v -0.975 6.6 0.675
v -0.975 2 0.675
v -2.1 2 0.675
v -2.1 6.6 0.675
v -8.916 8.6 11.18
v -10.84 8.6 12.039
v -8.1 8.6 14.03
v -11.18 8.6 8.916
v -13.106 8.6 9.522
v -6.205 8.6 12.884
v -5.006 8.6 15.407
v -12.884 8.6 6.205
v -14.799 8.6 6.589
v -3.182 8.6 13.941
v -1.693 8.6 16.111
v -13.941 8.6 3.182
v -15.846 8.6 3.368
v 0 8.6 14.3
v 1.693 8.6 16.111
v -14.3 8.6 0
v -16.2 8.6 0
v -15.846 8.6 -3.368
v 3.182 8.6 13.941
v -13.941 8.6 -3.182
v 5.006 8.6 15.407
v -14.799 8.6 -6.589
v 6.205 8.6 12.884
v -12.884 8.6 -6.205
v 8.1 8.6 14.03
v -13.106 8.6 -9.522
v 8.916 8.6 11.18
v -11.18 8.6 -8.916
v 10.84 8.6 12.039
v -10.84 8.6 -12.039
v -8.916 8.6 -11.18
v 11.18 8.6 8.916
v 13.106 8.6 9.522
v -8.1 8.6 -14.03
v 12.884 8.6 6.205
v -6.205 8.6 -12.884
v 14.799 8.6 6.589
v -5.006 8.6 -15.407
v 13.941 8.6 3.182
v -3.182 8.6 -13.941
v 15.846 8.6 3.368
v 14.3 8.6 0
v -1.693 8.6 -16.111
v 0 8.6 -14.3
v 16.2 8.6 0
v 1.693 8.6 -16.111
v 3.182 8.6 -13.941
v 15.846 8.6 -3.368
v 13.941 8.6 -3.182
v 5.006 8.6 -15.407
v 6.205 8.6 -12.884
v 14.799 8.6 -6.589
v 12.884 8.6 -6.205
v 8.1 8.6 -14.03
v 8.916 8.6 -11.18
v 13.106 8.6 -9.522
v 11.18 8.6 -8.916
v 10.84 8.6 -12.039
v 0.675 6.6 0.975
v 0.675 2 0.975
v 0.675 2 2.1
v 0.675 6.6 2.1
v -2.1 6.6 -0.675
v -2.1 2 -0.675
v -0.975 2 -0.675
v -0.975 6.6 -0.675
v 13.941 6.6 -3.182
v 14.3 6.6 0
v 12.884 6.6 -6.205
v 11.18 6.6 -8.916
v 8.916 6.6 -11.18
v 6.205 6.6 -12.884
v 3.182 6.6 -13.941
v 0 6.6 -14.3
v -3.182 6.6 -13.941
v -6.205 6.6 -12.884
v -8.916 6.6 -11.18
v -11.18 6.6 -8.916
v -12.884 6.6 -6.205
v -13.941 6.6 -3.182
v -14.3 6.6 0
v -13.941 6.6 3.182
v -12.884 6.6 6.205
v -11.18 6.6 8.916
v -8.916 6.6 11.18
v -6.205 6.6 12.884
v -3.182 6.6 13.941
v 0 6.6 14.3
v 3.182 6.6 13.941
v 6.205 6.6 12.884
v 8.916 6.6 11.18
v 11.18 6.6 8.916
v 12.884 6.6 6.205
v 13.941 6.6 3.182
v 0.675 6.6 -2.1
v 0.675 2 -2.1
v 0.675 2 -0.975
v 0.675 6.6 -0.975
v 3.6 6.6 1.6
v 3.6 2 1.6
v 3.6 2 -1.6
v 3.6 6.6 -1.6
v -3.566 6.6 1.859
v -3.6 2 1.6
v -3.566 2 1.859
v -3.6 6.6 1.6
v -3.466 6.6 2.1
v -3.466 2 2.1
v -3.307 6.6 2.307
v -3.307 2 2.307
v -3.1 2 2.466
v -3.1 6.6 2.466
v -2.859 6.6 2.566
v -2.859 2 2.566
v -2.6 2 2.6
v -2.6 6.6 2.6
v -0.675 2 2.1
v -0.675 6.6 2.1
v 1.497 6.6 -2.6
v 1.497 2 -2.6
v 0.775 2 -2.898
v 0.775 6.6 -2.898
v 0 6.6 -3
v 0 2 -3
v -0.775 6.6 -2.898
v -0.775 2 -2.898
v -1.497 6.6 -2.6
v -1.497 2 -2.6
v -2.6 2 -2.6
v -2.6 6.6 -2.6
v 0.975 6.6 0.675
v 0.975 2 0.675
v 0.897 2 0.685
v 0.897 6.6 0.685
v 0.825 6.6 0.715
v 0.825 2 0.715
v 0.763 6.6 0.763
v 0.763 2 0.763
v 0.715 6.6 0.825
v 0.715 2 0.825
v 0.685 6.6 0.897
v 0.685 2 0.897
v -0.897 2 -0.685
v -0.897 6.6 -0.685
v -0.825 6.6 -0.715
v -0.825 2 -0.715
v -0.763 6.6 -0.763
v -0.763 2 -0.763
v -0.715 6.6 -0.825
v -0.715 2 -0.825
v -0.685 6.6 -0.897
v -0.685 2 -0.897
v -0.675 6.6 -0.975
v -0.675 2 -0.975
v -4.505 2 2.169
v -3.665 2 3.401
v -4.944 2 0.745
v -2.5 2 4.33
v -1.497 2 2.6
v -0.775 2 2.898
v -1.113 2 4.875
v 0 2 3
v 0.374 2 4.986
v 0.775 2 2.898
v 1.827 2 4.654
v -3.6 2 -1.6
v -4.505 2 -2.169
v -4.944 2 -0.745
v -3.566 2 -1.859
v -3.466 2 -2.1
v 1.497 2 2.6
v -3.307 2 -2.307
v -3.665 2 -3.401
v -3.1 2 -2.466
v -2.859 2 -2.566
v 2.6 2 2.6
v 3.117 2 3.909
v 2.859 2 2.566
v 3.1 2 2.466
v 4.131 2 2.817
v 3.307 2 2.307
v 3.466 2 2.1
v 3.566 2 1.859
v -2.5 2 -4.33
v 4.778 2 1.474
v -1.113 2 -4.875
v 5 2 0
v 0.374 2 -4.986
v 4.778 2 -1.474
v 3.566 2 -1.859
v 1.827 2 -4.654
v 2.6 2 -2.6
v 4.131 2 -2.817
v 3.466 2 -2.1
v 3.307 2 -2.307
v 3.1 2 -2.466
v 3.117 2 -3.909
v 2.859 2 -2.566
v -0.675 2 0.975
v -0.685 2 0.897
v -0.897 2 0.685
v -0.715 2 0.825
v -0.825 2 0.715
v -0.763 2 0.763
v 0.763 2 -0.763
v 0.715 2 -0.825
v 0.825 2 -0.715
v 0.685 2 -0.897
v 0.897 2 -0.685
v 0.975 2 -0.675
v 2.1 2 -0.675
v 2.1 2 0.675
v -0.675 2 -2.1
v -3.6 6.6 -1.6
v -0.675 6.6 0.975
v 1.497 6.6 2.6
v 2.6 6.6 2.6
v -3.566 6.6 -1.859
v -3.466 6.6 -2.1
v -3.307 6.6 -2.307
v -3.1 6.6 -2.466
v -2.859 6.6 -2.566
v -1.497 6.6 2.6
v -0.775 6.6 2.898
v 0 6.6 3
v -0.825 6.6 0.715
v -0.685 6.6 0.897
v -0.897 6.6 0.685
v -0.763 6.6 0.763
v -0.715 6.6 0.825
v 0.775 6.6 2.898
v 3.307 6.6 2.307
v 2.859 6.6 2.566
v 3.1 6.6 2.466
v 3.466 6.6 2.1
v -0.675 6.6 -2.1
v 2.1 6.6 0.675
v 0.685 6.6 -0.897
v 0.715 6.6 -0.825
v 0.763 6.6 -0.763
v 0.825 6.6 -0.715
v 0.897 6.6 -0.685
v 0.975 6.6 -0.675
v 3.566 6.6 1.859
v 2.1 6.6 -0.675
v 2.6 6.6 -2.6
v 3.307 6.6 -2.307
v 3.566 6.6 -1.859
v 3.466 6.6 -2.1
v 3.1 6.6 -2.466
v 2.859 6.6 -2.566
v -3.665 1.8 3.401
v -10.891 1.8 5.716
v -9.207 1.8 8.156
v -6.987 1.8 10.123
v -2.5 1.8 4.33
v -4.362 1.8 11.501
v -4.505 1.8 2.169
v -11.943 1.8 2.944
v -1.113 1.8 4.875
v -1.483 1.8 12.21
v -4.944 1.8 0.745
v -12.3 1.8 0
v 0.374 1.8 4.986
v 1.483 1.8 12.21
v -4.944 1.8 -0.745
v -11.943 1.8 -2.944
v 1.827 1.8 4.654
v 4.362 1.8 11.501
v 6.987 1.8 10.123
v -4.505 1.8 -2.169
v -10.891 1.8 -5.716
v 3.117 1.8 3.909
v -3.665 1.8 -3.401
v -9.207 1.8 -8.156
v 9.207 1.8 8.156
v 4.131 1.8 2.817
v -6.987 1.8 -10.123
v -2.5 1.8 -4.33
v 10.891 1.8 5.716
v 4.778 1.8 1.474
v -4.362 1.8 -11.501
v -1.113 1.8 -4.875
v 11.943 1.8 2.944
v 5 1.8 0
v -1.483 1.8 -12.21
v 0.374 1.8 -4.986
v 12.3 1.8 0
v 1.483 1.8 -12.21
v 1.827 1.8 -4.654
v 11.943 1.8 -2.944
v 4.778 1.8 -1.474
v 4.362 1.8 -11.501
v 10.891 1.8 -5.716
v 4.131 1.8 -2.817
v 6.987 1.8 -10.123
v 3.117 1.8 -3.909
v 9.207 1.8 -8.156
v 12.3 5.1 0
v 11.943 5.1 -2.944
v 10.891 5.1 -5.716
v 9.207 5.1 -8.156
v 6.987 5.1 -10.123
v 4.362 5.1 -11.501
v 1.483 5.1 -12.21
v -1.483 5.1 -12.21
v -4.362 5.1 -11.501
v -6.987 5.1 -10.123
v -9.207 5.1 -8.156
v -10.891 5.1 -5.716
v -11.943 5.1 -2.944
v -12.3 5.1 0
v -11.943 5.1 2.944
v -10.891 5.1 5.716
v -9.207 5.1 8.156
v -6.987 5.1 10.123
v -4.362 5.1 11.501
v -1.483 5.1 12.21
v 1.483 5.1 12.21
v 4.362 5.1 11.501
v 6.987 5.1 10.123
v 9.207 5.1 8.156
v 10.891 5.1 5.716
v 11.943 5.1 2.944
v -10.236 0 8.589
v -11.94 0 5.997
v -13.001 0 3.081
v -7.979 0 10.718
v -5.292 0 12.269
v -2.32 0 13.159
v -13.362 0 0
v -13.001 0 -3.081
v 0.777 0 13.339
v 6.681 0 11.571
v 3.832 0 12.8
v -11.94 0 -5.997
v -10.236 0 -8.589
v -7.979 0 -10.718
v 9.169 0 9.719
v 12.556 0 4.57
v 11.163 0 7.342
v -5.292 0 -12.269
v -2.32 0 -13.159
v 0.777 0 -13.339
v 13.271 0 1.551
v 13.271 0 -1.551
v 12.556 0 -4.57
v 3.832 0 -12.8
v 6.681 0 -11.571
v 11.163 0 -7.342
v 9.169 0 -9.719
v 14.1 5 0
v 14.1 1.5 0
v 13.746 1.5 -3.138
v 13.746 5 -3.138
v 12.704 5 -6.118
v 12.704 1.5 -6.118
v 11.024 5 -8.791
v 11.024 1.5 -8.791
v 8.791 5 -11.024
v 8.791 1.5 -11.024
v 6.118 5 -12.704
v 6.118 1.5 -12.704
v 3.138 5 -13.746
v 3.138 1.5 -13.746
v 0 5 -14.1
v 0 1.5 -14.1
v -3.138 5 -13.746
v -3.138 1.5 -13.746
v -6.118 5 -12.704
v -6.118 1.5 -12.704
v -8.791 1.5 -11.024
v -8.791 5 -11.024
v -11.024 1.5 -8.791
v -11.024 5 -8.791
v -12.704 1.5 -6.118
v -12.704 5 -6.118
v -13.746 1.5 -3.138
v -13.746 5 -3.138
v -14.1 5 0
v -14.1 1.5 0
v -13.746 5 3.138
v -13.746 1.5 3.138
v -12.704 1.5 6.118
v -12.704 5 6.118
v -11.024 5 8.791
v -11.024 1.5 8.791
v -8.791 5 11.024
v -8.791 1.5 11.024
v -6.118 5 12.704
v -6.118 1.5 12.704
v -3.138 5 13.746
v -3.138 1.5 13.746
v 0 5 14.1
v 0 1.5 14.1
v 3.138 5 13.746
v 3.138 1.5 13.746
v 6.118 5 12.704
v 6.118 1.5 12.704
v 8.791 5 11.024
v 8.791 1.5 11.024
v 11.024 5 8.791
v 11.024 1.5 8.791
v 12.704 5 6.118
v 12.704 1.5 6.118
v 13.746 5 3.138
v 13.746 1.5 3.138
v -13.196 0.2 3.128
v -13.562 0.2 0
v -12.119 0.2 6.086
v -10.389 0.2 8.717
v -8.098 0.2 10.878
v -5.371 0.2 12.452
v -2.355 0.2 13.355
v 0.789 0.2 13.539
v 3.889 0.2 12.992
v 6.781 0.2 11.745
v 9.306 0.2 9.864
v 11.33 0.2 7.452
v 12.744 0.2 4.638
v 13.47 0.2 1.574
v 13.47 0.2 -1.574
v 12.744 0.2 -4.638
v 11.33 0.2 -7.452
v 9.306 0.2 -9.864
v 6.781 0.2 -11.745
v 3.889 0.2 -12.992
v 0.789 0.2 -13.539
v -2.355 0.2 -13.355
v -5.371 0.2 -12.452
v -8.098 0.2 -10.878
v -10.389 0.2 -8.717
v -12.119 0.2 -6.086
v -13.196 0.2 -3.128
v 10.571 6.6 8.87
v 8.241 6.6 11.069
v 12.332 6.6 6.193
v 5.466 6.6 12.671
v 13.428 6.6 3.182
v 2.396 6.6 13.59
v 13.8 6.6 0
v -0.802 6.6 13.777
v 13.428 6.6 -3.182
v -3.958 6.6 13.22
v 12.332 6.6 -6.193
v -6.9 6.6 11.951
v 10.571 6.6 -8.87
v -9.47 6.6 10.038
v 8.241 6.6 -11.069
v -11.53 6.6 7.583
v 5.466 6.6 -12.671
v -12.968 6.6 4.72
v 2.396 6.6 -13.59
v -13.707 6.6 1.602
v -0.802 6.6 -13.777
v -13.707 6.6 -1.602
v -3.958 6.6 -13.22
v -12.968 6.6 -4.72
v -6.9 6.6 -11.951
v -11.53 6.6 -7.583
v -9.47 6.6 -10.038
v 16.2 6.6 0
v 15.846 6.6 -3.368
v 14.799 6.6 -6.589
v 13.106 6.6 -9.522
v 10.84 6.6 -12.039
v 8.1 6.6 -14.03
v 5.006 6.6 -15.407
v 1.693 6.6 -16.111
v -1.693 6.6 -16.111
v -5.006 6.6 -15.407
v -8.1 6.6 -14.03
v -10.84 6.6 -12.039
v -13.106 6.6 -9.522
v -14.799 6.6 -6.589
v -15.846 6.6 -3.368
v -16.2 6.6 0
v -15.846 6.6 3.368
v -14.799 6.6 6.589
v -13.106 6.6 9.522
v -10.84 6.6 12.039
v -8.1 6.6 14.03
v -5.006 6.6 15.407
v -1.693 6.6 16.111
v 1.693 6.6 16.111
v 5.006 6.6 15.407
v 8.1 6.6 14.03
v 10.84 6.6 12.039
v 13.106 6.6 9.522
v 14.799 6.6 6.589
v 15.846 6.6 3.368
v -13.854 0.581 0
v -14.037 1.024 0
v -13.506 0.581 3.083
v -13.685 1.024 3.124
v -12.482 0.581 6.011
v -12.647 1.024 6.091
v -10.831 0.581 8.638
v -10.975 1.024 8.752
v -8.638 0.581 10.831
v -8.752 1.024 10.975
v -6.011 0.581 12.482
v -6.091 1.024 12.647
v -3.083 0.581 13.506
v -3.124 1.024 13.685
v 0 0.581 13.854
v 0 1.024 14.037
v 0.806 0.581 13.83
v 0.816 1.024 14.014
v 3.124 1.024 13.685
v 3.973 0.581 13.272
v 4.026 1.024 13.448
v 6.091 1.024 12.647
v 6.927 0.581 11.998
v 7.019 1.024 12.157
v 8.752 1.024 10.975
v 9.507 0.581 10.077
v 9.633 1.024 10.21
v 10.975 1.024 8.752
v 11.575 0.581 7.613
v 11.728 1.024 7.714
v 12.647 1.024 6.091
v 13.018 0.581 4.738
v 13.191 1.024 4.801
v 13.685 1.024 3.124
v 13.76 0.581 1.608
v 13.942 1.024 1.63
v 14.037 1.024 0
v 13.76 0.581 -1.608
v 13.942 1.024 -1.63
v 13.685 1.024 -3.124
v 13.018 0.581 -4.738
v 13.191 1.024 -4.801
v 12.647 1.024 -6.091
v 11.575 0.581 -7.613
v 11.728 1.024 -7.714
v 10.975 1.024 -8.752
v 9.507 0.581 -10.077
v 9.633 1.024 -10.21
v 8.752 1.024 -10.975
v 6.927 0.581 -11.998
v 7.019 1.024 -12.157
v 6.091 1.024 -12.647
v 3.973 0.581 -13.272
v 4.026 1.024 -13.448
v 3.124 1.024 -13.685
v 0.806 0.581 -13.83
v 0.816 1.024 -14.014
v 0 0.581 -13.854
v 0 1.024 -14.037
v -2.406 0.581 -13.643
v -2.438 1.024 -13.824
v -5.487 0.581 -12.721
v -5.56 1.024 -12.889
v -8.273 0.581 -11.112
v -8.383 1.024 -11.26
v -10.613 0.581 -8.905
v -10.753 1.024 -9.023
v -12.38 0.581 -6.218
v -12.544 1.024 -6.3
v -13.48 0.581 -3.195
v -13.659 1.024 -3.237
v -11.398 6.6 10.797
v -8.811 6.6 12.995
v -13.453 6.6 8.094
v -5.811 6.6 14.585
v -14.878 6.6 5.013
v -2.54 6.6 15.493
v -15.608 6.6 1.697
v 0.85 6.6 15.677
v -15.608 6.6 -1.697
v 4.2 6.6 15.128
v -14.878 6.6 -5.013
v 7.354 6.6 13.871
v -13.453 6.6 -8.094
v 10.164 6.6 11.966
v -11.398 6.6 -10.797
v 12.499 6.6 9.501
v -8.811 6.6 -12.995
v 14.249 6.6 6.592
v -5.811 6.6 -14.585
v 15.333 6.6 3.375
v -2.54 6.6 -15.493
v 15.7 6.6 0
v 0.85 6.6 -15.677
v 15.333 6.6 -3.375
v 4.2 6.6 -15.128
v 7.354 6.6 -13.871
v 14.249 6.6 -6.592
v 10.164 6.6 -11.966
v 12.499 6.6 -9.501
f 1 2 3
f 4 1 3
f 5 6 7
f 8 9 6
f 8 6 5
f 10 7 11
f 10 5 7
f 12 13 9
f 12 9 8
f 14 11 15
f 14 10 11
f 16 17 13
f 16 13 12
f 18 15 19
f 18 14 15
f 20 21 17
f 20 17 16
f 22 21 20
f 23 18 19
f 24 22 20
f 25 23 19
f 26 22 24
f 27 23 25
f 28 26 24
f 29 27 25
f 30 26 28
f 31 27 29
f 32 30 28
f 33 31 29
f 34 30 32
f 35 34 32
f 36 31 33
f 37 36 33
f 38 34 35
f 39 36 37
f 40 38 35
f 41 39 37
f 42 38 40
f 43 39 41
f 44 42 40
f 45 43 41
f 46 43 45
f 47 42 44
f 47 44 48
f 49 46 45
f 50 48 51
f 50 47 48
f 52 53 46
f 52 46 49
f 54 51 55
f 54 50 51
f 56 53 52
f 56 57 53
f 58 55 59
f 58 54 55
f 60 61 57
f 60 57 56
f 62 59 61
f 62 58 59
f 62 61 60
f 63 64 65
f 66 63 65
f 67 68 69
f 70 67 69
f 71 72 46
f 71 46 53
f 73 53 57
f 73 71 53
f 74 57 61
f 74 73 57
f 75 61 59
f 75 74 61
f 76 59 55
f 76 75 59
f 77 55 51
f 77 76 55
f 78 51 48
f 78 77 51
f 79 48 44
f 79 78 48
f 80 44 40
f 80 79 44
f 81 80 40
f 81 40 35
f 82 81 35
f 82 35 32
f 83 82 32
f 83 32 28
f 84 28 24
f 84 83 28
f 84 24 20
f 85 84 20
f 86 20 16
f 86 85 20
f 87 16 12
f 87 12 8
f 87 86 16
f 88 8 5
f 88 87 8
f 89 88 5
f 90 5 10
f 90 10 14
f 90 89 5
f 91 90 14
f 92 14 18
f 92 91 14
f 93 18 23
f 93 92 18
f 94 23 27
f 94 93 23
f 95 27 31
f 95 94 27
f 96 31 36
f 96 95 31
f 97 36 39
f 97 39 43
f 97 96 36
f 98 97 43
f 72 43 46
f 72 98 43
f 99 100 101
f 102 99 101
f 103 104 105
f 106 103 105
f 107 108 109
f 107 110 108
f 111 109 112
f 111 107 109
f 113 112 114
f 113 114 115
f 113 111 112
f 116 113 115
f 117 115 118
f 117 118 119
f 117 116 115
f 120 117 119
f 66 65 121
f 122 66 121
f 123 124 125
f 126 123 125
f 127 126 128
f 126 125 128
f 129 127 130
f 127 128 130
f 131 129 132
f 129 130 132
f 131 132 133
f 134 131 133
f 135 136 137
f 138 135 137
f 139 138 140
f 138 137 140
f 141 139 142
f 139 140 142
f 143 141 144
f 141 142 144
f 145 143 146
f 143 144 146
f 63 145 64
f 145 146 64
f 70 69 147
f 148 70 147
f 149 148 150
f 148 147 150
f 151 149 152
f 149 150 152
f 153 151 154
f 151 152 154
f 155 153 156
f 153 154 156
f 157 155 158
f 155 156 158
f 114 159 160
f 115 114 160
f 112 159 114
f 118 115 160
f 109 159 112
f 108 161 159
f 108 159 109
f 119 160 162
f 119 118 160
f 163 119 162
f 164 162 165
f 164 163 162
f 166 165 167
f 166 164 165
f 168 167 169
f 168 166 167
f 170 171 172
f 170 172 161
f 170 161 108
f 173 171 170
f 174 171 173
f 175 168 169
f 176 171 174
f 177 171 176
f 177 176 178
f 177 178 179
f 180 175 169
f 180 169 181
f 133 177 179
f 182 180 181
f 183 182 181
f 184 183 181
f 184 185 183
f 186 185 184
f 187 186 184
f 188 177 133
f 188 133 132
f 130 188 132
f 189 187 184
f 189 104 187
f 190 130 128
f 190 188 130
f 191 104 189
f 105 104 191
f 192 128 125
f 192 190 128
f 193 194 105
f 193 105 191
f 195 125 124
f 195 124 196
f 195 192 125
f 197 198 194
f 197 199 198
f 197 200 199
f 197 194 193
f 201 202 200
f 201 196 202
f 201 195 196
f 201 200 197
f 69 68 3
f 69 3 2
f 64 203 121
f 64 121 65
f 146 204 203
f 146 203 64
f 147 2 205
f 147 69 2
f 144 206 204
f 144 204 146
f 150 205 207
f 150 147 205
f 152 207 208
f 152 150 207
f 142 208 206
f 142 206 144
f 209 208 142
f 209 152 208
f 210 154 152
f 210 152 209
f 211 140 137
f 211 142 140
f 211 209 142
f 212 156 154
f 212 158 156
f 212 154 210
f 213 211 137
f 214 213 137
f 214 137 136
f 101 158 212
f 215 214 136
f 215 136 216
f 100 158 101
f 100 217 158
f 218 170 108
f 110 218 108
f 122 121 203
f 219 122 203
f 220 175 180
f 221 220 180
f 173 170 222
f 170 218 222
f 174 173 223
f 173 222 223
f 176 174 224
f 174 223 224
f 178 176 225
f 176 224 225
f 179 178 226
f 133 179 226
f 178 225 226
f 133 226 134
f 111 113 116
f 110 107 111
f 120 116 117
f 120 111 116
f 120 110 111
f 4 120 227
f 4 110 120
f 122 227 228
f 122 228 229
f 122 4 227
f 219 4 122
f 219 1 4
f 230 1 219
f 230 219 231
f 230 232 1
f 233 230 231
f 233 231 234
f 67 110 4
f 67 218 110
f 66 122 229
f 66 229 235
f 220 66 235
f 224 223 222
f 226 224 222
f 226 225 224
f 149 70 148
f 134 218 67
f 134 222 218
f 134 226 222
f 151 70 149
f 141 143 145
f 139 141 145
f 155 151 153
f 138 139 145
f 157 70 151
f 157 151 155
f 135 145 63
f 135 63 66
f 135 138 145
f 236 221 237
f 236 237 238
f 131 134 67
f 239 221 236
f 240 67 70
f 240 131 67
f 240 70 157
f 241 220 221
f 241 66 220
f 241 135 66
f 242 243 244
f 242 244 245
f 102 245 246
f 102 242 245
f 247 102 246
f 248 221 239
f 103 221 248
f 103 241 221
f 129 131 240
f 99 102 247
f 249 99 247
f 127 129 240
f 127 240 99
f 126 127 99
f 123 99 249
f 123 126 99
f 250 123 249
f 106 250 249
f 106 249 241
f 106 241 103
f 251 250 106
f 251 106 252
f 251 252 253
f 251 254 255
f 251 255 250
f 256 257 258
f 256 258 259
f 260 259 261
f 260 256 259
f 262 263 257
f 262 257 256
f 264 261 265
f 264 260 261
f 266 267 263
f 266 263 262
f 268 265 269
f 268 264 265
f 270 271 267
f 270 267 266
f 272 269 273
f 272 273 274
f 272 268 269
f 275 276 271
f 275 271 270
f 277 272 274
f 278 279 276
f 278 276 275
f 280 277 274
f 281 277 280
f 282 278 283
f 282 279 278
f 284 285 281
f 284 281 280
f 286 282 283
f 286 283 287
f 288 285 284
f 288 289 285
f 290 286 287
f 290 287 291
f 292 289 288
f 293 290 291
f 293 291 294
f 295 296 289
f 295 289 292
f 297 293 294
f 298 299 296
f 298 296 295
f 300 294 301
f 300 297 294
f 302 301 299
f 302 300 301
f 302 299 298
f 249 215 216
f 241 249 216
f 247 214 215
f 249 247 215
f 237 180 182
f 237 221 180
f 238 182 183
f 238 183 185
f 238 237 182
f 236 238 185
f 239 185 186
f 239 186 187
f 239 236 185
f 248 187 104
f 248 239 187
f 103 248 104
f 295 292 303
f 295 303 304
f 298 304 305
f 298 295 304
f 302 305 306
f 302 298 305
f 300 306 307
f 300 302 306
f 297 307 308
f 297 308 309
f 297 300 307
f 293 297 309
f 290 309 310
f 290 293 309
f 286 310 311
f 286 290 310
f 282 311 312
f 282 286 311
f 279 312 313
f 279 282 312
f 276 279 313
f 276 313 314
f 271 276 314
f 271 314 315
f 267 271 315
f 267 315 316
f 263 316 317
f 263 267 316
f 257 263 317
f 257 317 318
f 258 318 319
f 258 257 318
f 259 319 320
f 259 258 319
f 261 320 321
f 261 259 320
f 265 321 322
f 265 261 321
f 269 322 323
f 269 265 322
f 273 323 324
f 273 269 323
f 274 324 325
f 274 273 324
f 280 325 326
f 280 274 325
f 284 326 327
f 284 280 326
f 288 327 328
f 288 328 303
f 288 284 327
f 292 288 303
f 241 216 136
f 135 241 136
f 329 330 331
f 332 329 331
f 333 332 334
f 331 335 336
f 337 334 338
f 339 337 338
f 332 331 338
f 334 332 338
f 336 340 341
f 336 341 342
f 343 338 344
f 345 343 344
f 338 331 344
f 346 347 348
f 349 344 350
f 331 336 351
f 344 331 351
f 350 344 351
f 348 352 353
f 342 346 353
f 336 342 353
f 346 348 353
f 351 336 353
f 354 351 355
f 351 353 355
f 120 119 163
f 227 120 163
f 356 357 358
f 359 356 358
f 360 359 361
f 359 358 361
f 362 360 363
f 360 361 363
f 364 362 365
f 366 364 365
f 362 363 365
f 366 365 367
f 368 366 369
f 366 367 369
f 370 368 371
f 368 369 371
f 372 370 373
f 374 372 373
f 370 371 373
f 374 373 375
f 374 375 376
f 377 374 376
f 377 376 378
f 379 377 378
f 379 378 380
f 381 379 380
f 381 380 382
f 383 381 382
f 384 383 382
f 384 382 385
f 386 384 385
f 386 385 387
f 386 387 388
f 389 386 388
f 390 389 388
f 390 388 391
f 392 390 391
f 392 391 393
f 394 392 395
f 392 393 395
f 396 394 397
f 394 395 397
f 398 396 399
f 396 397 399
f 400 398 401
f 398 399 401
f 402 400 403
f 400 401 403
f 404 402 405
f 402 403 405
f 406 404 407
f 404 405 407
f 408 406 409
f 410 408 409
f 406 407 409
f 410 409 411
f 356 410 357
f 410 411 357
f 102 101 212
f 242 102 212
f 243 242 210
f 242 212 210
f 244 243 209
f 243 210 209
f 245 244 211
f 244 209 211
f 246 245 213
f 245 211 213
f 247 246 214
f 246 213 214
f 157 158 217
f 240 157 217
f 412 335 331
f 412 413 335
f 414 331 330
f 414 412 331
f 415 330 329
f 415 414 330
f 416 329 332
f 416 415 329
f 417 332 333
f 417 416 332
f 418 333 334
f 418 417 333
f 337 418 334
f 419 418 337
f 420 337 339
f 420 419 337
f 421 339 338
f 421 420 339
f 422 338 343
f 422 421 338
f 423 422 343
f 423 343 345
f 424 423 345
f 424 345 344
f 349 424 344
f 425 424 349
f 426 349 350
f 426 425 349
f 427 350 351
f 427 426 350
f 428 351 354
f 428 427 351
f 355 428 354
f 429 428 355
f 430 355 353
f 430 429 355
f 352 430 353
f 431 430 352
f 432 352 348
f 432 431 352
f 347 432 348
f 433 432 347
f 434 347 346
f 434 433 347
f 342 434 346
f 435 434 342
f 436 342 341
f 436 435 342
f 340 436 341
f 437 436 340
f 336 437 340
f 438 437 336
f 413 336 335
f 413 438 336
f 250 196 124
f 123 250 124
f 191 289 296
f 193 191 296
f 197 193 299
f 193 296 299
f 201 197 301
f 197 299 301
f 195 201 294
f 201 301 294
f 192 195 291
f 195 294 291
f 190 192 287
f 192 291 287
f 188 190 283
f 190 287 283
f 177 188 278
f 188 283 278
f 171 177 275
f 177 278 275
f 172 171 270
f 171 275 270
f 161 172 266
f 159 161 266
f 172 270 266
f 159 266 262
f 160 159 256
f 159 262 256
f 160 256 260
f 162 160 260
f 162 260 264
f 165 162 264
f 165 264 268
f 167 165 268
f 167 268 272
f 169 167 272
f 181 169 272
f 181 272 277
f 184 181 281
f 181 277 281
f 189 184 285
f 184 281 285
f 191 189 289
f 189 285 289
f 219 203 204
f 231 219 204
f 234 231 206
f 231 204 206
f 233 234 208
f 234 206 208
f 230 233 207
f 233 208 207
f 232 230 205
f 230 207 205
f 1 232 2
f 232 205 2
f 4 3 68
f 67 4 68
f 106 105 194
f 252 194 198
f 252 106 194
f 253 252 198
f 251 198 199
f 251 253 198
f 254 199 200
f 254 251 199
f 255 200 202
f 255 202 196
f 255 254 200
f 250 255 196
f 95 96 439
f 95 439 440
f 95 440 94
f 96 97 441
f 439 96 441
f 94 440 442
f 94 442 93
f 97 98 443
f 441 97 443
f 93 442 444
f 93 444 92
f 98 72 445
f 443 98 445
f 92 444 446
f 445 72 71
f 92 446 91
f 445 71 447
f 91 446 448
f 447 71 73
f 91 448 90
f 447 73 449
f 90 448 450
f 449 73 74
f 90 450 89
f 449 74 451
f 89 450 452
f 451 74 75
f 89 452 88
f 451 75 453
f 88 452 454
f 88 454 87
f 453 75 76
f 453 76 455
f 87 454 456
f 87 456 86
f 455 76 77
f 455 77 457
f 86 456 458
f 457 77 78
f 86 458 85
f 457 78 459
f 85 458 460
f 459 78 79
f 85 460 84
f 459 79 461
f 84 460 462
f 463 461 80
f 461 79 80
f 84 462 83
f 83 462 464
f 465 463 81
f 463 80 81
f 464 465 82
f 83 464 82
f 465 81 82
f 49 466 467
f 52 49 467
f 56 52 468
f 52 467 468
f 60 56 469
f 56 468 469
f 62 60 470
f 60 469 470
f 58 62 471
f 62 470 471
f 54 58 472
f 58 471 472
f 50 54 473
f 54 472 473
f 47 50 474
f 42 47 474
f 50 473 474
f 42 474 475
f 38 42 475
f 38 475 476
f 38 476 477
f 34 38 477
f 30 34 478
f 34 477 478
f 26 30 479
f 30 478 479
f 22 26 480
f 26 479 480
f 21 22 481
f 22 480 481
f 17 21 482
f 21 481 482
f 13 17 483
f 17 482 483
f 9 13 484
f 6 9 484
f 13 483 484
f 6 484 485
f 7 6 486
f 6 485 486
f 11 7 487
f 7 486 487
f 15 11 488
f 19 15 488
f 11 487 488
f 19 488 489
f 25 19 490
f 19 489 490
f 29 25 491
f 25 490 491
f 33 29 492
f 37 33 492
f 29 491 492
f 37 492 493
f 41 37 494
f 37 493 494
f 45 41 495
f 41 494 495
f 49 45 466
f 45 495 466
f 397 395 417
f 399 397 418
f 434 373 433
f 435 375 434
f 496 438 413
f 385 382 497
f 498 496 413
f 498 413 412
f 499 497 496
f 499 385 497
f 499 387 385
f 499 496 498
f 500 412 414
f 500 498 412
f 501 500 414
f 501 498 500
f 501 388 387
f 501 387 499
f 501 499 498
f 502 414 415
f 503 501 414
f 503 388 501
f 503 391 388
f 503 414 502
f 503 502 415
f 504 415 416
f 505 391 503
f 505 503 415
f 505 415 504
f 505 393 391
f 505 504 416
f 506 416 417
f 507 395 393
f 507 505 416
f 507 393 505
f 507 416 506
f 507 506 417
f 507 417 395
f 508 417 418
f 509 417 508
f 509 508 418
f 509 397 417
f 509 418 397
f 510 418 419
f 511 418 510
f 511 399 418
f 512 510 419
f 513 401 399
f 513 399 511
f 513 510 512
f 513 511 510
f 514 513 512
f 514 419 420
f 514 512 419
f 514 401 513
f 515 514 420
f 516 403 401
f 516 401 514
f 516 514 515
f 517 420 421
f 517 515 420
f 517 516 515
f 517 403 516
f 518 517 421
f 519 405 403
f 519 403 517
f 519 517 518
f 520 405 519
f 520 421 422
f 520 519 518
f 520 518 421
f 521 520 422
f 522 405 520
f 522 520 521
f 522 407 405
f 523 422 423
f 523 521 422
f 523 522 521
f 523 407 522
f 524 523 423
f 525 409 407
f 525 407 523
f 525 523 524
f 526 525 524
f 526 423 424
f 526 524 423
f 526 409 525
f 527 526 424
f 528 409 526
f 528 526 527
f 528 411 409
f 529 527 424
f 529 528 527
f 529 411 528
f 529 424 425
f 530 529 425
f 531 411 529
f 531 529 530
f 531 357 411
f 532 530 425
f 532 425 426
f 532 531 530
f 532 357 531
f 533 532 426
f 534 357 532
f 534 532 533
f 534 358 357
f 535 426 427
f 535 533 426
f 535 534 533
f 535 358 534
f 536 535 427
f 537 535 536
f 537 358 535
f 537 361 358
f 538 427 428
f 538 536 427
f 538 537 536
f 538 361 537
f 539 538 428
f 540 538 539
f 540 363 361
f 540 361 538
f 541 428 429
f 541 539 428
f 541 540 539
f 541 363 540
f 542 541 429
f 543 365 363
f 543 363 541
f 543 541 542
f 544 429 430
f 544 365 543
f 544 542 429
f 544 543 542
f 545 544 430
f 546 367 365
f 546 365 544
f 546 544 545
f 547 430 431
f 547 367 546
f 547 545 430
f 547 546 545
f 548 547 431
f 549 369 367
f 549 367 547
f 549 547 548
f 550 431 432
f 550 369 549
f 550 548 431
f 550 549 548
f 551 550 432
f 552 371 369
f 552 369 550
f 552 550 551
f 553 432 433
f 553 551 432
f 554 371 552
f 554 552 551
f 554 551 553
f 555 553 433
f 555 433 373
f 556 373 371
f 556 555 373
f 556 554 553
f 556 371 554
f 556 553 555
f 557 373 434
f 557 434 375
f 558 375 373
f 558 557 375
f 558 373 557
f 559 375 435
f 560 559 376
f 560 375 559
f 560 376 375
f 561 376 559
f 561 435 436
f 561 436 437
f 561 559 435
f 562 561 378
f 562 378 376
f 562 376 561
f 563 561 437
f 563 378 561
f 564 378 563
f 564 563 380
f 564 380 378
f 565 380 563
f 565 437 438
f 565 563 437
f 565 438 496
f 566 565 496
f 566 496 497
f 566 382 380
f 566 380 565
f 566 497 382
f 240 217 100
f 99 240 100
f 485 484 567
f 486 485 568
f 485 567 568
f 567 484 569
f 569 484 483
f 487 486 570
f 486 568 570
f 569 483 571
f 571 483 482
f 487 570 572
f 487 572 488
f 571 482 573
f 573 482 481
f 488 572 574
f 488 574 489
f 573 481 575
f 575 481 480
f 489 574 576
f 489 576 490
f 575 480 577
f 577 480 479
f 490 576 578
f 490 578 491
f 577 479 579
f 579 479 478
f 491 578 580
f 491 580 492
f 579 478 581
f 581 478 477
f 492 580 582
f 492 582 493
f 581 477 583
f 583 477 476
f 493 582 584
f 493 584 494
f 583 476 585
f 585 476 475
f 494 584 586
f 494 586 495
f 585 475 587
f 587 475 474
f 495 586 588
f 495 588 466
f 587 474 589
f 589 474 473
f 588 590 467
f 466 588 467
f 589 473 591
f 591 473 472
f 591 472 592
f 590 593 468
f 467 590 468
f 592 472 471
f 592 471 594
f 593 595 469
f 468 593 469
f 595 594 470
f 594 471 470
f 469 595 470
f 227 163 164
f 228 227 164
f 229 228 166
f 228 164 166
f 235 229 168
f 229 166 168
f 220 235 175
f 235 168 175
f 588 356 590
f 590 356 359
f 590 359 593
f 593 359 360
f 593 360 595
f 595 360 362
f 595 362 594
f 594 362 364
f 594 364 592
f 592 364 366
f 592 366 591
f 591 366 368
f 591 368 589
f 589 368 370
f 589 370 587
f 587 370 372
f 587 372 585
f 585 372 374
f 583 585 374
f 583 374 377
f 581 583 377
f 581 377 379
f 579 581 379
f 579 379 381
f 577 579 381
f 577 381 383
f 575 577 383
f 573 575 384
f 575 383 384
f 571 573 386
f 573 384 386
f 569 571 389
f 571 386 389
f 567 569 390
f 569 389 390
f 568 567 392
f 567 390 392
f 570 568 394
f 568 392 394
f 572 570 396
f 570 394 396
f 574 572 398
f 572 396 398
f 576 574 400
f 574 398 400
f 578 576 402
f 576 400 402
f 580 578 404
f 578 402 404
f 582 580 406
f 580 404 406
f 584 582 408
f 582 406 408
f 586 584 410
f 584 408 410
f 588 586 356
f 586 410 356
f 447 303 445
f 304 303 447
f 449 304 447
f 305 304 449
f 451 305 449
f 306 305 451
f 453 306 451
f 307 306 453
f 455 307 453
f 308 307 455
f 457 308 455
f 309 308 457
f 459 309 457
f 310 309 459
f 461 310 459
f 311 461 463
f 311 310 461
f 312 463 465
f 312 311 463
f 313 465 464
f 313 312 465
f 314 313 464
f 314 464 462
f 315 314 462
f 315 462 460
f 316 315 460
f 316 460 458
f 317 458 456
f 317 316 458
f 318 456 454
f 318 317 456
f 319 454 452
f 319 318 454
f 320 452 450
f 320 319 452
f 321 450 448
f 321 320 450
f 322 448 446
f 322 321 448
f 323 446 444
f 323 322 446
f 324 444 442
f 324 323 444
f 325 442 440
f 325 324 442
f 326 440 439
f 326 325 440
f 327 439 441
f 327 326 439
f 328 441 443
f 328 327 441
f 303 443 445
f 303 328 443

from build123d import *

# Parameters (mm, degrees)
SKETCH1_R           = 14.1
BUTTON_TOP_DEPTH    = 1.8
SKETCH2_R           = 14.1
SKETCH2_R_2         = 12.3
BUTTON_WALLS_DEPTH  = 4.8
SKETCH5_R           = 5
OFFSET_2_DEPTH      = 0.2
STEM_START          = 0.2
STEM_HOUSING_DEPTH  = 4.6
CHAMFER1_SIZE       = 1.5
FILLET2_R           = 1
SKETCH8_R           = 16.2
SKETCH8_R_2         = 14.3
BOSS_EXTRUDE1_DEPTH = 2


with BuildPart() as part:
    # Sketch1 → button top (new body)
    with BuildSketch(Plane(origin=(0, 0, 0), x_dir=(1, 0, 0), z_dir=(0, 1, 0))):
        Circle(SKETCH1_R)
    extrude(amount=BUTTON_TOP_DEPTH)

    # Sketch2 → button walls (add)
    with BuildSketch(Plane(origin=(0, 1.8, 0), x_dir=(1, 0, 0), z_dir=(0, 1, 0))):
        Circle(SKETCH2_R)
        Circle(SKETCH2_R_2, mode=Mode.SUBTRACT)
    extrude(amount=BUTTON_WALLS_DEPTH)

    # Sketch5 → offset 2 (add)
    with BuildSketch(Plane(origin=(0, 1.8, 0), x_dir=(1, 0, 0), z_dir=(0, 1, 0))):
        Circle(SKETCH5_R)
    extrude(amount=OFFSET_2_DEPTH)

    # Sketch3 → stem housing (add)
    with BuildSketch(Plane(origin=(0, 1.8, 0), x_dir=(1, 0, 0), z_dir=(0, 1, 0)).offset(STEM_START)):
        with BuildLine():
            Line((-3.6, 2.6), (-3.6, -2.6))
            Line((-3.6, -2.6), (-1.496662955, -2.6))
            ThreePointArc((-1.496662955, -2.6), (-3, 0), (-1.496662955, 2.6))
            Line((-1.496662955, 2.6), (-3.6, 2.6))
        make_face()
        with BuildLine():
            ThreePointArc((-1.496662955, 2.6), (-3, 0), (-1.496662955, -2.6))
            Line((-1.496662955, -2.6), (1.496662955, -2.6))
            ThreePointArc((1.496662955, -2.6), (2.597112711, -1.501667596), (3, 0))
            ThreePointArc((3, 0), (2.597112711, 1.501667596), (1.496662955, 2.6))
            Line((1.496662955, 2.6), (-1.496662955, 2.6))
        make_face()
        with BuildLine():
            ThreePointArc((-0.975, 0.675), (-0.762867966, 0.762867966), (-0.675, 0.975))
            Line((-0.675, 0.975), (-0.675, 2.1))
            Line((-0.675, 2.1), (0.675, 2.1))
            Line((0.675, 2.1), (0.675, 0.975))
            ThreePointArc((0.675, 0.975), (0.762867966, 0.762867966), (0.975, 0.675))
            Line((0.975, 0.675), (2.1, 0.675))
            Line((2.1, 0.675), (2.1, -0.675))
            Line((2.1, -0.675), (0.975, -0.675))
            ThreePointArc((0.975, -0.675), (0.762867966, -0.762867966), (0.675, -0.975))
            Line((0.675, -0.975), (0.675, -2.1))
            Line((0.675, -2.1), (-0.675, -2.1))
            Line((-0.675, -2.1), (-0.675, -0.975))
            ThreePointArc((-0.675, -0.975), (-0.762867966, -0.762867966), (-0.975, -0.675))
            Line((-0.975, -0.675), (-2.1, -0.675))
            Line((-2.1, -0.675), (-2.1, 0.675))
            Line((-2.1, 0.675), (-0.975, 0.675))
        make_face(mode=Mode.SUBTRACT)
        with BuildLine():
            ThreePointArc((3, 0), (2.597112711, -1.501667596), (1.496662955, -2.6))
            Line((1.496662955, -2.6), (3.6, -2.6))
            Line((3.6, -2.6), (3.6, 2.6))
            Line((3.6, 2.6), (1.496662955, 2.6))
            ThreePointArc((1.496662955, 2.6), (2.597112711, 1.501667596), (3, 0))
        make_face()
        with BuildLine():
            ThreePointArc((1.496662955, 2.6), (0, 3), (-1.496662955, 2.6))
            Line((-1.496662955, 2.6), (1.496662955, 2.6))
        make_face()
        with BuildLine():
            Line((1.496662955, -2.6), (-1.496662955, -2.6))
            ThreePointArc((-1.496662955, -2.6), (0, -3), (1.496662955, -2.6))
        make_face()
    extrude(amount=STEM_HOUSING_DEPTH)

    # Chamfer1
    chamfer1_edges = [part.edges().sort_by_distance(p)[0] for p in [
        (-12.3, 6.6, 0),
    ]]
    chamfer(chamfer1_edges, length=CHAMFER1_SIZE)

    # Fillet2
    fillet2_edges = [part.edges().sort_by_distance(p)[0] for p in [
        (-3.6, 4.3, -2.6),
        (-3.6, 4.3, 2.6),
        (3.6, 4.3, 2.6),
        (3.6, 4.3, -2.6),
    ]]
    fillet(fillet2_edges, radius=FILLET2_R)

    # Sketch6 → Cut-Revolve1 (revolve, cut)
    with BuildSketch(Plane.XY):
        with BuildLine():
            Line((-13.361522369, 0), (-13.561522369, 0.2))
            ThreePointArc((-13.561522369, 0.2), (-13.960054223, 0.79644507), (-14.1, 1.5))
            Line((-14.1, 1.5), (-14.1, 0))
            Line((-14.1, 0), (-13.361522369, 0))
        make_face()
    revolve(axis=Axis((0, 0, 0), (0, 1, 0)), mode=Mode.SUBTRACT)

    # Sketch7 → Revolve1 (revolve)
    with BuildSketch(Plane.XY):
        Polygon((14.1, 6.6), (15.7, 6.6), (14.1, 5), align=None)
    revolve(axis=Axis((0, 0, 0), (0, 1, 0)))

    # Sketch8 → Boss-Extrude1 (add)
    with BuildSketch(Plane(origin=(0, 6.6, 0), x_dir=(1, 0, 0), z_dir=(0, 1, 0))):
        Circle(SKETCH8_R)
        Circle(SKETCH8_R_2, mode=Mode.SUBTRACT)
    extrude(amount=BOSS_EXTRUDE1_DEPTH)


solid = part.part
